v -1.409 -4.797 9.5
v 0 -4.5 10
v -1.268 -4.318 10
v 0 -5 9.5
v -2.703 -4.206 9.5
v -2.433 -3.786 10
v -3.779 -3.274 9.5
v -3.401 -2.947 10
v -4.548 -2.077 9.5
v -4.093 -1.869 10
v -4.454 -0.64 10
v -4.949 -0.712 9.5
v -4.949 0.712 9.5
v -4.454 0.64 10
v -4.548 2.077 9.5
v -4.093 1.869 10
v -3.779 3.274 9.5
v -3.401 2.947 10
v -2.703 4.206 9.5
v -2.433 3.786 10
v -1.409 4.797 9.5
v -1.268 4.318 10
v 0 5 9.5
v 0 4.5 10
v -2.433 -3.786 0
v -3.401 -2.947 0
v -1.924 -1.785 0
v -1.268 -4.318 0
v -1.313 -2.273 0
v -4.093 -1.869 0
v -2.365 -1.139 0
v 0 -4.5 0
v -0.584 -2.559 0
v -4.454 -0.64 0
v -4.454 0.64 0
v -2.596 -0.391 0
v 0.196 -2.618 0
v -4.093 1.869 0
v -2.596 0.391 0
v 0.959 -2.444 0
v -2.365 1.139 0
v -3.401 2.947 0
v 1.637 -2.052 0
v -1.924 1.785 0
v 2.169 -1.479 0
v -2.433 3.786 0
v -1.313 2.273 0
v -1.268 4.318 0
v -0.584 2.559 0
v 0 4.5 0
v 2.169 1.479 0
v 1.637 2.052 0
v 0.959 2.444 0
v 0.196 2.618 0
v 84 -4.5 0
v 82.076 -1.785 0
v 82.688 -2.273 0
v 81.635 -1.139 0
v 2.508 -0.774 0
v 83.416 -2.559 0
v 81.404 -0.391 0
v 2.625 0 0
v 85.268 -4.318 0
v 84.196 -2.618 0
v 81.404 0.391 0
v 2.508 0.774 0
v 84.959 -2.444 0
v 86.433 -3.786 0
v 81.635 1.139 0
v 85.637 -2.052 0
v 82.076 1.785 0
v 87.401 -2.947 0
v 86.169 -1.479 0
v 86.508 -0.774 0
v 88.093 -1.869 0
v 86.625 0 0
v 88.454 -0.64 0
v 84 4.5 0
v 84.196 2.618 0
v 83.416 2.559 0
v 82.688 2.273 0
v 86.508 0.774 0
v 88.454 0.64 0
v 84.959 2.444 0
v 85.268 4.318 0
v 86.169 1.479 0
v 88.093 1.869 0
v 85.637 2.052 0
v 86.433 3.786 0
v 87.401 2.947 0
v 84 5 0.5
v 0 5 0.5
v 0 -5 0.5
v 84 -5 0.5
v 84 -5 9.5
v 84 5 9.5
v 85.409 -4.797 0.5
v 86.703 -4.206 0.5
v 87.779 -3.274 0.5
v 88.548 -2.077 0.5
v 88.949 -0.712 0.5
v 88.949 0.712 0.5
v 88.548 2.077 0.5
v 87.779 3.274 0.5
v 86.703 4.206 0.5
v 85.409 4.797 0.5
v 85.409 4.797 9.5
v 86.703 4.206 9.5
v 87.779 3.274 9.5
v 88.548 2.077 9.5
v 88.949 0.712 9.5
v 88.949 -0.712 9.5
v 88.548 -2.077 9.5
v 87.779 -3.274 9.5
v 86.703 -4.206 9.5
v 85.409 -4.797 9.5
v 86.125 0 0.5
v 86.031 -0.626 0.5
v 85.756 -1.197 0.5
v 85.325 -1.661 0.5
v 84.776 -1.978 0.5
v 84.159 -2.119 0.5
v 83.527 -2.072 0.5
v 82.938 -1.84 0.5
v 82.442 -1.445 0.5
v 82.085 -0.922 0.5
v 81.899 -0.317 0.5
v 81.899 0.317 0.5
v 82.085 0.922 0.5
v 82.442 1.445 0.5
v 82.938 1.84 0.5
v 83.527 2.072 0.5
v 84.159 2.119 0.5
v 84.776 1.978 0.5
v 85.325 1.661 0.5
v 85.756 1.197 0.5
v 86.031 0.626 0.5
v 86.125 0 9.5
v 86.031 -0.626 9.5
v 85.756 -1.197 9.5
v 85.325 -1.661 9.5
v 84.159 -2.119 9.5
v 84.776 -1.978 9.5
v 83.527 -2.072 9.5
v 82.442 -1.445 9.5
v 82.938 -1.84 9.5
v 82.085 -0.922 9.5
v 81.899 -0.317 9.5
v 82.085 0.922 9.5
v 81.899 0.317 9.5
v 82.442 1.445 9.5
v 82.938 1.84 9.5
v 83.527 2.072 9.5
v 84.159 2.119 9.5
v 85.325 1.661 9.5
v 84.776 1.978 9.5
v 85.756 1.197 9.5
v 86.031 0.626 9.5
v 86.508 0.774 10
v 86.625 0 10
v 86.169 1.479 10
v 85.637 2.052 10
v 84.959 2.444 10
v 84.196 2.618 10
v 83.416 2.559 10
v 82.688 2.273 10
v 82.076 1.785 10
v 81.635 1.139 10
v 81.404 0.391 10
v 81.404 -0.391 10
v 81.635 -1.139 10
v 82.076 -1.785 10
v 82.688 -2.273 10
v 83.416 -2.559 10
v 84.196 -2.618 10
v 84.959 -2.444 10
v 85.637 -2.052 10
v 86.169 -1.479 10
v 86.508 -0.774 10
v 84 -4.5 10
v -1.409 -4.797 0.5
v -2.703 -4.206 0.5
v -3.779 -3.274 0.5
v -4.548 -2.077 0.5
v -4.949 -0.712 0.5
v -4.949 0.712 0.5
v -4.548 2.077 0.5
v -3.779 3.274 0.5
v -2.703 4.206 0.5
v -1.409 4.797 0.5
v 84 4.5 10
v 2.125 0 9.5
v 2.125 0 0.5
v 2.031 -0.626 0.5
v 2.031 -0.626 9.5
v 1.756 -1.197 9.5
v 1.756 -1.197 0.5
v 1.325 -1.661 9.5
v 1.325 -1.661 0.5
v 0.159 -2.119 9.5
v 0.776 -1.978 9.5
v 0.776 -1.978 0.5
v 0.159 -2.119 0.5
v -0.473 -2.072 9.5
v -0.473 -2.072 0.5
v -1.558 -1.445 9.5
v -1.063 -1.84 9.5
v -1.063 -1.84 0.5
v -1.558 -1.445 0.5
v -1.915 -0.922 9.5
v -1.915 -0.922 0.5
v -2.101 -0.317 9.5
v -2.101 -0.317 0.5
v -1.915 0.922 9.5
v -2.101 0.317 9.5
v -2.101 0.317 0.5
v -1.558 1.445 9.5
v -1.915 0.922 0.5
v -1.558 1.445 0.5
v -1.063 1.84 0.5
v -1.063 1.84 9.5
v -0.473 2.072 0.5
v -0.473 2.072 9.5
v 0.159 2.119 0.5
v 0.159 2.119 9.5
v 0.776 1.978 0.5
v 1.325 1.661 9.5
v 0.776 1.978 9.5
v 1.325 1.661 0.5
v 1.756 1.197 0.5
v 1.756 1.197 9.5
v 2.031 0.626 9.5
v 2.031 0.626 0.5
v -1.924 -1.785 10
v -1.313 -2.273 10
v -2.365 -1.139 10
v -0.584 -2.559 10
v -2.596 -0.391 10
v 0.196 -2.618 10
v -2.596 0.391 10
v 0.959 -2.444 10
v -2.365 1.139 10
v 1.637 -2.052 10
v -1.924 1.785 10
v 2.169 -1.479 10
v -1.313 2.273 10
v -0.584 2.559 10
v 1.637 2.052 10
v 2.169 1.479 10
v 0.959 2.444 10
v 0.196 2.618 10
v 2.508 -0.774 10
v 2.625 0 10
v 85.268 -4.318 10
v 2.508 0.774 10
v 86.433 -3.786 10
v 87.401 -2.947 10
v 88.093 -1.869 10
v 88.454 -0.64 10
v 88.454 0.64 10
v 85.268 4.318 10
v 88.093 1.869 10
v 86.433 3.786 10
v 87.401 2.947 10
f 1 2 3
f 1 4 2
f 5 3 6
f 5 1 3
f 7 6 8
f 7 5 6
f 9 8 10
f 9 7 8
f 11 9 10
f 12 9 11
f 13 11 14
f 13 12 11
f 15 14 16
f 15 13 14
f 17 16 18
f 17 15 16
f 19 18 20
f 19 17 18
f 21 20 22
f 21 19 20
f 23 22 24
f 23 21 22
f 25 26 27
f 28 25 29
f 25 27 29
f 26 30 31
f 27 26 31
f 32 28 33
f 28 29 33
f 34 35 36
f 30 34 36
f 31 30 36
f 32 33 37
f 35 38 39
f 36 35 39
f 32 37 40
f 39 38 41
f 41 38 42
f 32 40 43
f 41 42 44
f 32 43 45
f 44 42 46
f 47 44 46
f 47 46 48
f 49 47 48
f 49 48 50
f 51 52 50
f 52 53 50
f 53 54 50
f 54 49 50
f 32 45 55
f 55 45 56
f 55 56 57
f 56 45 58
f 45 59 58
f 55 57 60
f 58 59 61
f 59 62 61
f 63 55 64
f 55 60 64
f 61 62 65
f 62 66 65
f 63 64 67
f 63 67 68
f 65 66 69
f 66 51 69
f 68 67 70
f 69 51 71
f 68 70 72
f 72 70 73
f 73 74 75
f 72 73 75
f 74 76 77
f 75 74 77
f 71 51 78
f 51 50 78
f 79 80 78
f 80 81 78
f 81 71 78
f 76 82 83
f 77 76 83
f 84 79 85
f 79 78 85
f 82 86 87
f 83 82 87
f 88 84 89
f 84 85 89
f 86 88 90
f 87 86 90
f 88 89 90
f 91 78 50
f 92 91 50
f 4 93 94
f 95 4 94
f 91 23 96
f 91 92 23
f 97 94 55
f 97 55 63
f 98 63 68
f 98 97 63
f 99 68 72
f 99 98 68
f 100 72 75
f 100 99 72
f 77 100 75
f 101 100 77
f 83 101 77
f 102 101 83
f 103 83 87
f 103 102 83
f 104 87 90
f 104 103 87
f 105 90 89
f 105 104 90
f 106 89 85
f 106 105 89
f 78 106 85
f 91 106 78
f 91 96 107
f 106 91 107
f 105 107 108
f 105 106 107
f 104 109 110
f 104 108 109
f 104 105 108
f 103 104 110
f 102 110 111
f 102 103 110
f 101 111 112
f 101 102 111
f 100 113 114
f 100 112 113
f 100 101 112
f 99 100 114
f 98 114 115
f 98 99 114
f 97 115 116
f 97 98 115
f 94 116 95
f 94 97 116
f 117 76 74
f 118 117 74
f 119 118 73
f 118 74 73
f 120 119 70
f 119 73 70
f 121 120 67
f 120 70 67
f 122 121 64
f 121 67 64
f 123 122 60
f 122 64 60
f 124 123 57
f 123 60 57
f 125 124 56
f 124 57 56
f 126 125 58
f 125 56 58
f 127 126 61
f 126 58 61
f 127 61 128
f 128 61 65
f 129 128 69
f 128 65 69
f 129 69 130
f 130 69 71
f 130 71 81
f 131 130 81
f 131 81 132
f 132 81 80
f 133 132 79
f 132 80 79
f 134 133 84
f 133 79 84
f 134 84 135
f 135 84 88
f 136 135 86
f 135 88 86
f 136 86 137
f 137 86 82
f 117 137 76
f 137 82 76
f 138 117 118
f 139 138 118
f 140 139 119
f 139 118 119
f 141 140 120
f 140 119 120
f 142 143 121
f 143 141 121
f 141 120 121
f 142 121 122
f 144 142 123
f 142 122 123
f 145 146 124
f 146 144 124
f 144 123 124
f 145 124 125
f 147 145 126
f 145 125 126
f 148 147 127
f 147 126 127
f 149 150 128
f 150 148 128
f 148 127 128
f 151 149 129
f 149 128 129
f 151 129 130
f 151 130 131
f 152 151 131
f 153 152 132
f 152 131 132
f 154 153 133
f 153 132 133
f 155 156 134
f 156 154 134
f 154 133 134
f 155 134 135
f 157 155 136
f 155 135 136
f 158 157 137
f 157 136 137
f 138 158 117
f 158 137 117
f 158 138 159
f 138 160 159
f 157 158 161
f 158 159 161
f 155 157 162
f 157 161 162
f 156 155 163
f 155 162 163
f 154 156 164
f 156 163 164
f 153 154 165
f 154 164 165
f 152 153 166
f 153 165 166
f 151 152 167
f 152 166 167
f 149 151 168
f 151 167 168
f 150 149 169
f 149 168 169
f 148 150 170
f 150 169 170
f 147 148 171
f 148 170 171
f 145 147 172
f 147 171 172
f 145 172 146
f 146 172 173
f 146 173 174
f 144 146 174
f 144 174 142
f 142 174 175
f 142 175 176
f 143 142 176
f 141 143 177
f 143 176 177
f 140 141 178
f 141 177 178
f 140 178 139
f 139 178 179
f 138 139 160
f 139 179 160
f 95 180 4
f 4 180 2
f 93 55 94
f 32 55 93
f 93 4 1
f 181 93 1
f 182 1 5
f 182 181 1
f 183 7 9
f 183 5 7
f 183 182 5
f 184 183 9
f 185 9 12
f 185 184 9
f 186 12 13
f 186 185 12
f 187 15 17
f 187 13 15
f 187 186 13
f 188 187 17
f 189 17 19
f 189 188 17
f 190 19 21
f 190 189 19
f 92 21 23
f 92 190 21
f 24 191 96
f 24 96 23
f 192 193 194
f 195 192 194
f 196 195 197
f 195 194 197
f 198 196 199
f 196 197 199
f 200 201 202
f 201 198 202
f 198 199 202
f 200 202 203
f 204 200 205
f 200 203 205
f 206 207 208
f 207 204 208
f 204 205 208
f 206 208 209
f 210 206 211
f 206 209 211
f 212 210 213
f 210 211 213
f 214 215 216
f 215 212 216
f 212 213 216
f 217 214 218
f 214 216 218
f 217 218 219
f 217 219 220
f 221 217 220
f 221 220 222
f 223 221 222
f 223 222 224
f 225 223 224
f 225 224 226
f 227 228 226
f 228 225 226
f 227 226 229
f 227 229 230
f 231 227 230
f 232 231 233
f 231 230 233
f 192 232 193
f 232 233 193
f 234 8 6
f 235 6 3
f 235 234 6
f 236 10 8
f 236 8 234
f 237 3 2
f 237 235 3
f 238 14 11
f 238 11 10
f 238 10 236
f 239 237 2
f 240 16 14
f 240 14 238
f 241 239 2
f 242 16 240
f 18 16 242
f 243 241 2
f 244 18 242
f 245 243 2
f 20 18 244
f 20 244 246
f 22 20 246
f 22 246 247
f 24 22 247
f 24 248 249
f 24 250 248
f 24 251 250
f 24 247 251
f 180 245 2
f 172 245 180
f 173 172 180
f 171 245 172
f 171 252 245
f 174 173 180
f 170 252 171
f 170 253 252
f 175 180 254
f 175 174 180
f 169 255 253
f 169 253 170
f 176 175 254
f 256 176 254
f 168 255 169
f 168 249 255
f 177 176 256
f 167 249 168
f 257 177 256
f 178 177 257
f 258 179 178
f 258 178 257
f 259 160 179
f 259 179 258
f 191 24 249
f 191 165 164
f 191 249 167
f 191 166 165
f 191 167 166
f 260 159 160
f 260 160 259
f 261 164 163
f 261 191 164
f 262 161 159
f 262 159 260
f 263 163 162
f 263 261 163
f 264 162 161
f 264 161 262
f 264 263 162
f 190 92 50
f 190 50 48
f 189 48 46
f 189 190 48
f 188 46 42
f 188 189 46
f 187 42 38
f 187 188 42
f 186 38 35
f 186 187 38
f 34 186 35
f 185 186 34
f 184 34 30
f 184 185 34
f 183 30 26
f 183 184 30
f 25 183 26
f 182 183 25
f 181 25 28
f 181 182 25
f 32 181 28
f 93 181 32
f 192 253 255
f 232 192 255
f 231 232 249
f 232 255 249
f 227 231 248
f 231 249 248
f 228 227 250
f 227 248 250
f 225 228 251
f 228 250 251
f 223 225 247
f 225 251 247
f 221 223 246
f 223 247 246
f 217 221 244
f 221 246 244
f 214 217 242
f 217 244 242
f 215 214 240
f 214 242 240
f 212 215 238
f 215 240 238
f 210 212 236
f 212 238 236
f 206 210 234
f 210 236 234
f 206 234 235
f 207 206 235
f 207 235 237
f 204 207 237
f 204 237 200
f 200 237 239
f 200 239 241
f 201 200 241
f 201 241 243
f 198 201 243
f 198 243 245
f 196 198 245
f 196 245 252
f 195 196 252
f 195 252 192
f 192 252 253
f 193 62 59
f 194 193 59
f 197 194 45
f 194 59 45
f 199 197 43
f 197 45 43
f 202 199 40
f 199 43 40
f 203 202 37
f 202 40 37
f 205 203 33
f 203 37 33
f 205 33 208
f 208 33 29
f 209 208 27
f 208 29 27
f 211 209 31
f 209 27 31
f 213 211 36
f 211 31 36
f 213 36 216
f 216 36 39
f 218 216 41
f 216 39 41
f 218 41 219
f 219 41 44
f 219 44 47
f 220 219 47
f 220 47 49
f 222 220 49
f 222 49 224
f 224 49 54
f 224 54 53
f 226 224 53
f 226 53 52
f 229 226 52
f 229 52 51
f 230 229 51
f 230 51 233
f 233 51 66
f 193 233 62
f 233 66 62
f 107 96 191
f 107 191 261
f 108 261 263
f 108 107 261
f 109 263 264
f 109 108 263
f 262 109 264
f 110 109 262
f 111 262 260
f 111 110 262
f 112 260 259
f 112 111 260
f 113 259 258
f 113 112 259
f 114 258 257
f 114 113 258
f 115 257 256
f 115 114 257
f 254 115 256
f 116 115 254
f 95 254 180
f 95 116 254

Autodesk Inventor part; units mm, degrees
ref_plane "YZ Plane" through (0, 0, 0) normal (1, 0, 0) x (0, 1, 0)
ref_plane "XZ Plane" through (0, 0, 0) normal (0, 1, 0) x (-1, 0, 0)
ref_plane "XY Plane" through (0, 0, 0) normal (0, 0, 1) x (1, 0, 0)
sketch "Sketch1" plane through (0, 0, 0) normal (0, 0, 1) x (1, 0, 0)
  circle A0 centre (0, 0) radius 2.125
  circle A1 centre (84, 0) radius 2.125
  arc A2 (84, -5) -> (84, 5) centre (84, 0) ccw
  arc A3 (0, 5) -> (0, -5) centre (0, 0) ccw
  line L0 (0, 5) -> (84, 5)
  line L1 (0, -5) -> (84, -5)
  dimension "d0" = 4.25
  dimension "d1" = 4.25
  dimension "d2" = 10
  dimension "d3" = 10
extrude "Extrusion1" add sketch "Sketch1" along normal blind 10
chamfer "Chamfer1" distance 0.5 angle 45 12 edges at (-2.125, 0, 10) (-2.125, 0, 0) (42, -5, 0) (89, 0, 0) (42, 5, 0) (-5, 0, 0) (42, -5, 10) (89, 0, 10) (42, 5, 10) (-5, 0, 10) (81.875, 0, 10) (81.875, 0, 0)
properties part number "HeightAdjustment"
